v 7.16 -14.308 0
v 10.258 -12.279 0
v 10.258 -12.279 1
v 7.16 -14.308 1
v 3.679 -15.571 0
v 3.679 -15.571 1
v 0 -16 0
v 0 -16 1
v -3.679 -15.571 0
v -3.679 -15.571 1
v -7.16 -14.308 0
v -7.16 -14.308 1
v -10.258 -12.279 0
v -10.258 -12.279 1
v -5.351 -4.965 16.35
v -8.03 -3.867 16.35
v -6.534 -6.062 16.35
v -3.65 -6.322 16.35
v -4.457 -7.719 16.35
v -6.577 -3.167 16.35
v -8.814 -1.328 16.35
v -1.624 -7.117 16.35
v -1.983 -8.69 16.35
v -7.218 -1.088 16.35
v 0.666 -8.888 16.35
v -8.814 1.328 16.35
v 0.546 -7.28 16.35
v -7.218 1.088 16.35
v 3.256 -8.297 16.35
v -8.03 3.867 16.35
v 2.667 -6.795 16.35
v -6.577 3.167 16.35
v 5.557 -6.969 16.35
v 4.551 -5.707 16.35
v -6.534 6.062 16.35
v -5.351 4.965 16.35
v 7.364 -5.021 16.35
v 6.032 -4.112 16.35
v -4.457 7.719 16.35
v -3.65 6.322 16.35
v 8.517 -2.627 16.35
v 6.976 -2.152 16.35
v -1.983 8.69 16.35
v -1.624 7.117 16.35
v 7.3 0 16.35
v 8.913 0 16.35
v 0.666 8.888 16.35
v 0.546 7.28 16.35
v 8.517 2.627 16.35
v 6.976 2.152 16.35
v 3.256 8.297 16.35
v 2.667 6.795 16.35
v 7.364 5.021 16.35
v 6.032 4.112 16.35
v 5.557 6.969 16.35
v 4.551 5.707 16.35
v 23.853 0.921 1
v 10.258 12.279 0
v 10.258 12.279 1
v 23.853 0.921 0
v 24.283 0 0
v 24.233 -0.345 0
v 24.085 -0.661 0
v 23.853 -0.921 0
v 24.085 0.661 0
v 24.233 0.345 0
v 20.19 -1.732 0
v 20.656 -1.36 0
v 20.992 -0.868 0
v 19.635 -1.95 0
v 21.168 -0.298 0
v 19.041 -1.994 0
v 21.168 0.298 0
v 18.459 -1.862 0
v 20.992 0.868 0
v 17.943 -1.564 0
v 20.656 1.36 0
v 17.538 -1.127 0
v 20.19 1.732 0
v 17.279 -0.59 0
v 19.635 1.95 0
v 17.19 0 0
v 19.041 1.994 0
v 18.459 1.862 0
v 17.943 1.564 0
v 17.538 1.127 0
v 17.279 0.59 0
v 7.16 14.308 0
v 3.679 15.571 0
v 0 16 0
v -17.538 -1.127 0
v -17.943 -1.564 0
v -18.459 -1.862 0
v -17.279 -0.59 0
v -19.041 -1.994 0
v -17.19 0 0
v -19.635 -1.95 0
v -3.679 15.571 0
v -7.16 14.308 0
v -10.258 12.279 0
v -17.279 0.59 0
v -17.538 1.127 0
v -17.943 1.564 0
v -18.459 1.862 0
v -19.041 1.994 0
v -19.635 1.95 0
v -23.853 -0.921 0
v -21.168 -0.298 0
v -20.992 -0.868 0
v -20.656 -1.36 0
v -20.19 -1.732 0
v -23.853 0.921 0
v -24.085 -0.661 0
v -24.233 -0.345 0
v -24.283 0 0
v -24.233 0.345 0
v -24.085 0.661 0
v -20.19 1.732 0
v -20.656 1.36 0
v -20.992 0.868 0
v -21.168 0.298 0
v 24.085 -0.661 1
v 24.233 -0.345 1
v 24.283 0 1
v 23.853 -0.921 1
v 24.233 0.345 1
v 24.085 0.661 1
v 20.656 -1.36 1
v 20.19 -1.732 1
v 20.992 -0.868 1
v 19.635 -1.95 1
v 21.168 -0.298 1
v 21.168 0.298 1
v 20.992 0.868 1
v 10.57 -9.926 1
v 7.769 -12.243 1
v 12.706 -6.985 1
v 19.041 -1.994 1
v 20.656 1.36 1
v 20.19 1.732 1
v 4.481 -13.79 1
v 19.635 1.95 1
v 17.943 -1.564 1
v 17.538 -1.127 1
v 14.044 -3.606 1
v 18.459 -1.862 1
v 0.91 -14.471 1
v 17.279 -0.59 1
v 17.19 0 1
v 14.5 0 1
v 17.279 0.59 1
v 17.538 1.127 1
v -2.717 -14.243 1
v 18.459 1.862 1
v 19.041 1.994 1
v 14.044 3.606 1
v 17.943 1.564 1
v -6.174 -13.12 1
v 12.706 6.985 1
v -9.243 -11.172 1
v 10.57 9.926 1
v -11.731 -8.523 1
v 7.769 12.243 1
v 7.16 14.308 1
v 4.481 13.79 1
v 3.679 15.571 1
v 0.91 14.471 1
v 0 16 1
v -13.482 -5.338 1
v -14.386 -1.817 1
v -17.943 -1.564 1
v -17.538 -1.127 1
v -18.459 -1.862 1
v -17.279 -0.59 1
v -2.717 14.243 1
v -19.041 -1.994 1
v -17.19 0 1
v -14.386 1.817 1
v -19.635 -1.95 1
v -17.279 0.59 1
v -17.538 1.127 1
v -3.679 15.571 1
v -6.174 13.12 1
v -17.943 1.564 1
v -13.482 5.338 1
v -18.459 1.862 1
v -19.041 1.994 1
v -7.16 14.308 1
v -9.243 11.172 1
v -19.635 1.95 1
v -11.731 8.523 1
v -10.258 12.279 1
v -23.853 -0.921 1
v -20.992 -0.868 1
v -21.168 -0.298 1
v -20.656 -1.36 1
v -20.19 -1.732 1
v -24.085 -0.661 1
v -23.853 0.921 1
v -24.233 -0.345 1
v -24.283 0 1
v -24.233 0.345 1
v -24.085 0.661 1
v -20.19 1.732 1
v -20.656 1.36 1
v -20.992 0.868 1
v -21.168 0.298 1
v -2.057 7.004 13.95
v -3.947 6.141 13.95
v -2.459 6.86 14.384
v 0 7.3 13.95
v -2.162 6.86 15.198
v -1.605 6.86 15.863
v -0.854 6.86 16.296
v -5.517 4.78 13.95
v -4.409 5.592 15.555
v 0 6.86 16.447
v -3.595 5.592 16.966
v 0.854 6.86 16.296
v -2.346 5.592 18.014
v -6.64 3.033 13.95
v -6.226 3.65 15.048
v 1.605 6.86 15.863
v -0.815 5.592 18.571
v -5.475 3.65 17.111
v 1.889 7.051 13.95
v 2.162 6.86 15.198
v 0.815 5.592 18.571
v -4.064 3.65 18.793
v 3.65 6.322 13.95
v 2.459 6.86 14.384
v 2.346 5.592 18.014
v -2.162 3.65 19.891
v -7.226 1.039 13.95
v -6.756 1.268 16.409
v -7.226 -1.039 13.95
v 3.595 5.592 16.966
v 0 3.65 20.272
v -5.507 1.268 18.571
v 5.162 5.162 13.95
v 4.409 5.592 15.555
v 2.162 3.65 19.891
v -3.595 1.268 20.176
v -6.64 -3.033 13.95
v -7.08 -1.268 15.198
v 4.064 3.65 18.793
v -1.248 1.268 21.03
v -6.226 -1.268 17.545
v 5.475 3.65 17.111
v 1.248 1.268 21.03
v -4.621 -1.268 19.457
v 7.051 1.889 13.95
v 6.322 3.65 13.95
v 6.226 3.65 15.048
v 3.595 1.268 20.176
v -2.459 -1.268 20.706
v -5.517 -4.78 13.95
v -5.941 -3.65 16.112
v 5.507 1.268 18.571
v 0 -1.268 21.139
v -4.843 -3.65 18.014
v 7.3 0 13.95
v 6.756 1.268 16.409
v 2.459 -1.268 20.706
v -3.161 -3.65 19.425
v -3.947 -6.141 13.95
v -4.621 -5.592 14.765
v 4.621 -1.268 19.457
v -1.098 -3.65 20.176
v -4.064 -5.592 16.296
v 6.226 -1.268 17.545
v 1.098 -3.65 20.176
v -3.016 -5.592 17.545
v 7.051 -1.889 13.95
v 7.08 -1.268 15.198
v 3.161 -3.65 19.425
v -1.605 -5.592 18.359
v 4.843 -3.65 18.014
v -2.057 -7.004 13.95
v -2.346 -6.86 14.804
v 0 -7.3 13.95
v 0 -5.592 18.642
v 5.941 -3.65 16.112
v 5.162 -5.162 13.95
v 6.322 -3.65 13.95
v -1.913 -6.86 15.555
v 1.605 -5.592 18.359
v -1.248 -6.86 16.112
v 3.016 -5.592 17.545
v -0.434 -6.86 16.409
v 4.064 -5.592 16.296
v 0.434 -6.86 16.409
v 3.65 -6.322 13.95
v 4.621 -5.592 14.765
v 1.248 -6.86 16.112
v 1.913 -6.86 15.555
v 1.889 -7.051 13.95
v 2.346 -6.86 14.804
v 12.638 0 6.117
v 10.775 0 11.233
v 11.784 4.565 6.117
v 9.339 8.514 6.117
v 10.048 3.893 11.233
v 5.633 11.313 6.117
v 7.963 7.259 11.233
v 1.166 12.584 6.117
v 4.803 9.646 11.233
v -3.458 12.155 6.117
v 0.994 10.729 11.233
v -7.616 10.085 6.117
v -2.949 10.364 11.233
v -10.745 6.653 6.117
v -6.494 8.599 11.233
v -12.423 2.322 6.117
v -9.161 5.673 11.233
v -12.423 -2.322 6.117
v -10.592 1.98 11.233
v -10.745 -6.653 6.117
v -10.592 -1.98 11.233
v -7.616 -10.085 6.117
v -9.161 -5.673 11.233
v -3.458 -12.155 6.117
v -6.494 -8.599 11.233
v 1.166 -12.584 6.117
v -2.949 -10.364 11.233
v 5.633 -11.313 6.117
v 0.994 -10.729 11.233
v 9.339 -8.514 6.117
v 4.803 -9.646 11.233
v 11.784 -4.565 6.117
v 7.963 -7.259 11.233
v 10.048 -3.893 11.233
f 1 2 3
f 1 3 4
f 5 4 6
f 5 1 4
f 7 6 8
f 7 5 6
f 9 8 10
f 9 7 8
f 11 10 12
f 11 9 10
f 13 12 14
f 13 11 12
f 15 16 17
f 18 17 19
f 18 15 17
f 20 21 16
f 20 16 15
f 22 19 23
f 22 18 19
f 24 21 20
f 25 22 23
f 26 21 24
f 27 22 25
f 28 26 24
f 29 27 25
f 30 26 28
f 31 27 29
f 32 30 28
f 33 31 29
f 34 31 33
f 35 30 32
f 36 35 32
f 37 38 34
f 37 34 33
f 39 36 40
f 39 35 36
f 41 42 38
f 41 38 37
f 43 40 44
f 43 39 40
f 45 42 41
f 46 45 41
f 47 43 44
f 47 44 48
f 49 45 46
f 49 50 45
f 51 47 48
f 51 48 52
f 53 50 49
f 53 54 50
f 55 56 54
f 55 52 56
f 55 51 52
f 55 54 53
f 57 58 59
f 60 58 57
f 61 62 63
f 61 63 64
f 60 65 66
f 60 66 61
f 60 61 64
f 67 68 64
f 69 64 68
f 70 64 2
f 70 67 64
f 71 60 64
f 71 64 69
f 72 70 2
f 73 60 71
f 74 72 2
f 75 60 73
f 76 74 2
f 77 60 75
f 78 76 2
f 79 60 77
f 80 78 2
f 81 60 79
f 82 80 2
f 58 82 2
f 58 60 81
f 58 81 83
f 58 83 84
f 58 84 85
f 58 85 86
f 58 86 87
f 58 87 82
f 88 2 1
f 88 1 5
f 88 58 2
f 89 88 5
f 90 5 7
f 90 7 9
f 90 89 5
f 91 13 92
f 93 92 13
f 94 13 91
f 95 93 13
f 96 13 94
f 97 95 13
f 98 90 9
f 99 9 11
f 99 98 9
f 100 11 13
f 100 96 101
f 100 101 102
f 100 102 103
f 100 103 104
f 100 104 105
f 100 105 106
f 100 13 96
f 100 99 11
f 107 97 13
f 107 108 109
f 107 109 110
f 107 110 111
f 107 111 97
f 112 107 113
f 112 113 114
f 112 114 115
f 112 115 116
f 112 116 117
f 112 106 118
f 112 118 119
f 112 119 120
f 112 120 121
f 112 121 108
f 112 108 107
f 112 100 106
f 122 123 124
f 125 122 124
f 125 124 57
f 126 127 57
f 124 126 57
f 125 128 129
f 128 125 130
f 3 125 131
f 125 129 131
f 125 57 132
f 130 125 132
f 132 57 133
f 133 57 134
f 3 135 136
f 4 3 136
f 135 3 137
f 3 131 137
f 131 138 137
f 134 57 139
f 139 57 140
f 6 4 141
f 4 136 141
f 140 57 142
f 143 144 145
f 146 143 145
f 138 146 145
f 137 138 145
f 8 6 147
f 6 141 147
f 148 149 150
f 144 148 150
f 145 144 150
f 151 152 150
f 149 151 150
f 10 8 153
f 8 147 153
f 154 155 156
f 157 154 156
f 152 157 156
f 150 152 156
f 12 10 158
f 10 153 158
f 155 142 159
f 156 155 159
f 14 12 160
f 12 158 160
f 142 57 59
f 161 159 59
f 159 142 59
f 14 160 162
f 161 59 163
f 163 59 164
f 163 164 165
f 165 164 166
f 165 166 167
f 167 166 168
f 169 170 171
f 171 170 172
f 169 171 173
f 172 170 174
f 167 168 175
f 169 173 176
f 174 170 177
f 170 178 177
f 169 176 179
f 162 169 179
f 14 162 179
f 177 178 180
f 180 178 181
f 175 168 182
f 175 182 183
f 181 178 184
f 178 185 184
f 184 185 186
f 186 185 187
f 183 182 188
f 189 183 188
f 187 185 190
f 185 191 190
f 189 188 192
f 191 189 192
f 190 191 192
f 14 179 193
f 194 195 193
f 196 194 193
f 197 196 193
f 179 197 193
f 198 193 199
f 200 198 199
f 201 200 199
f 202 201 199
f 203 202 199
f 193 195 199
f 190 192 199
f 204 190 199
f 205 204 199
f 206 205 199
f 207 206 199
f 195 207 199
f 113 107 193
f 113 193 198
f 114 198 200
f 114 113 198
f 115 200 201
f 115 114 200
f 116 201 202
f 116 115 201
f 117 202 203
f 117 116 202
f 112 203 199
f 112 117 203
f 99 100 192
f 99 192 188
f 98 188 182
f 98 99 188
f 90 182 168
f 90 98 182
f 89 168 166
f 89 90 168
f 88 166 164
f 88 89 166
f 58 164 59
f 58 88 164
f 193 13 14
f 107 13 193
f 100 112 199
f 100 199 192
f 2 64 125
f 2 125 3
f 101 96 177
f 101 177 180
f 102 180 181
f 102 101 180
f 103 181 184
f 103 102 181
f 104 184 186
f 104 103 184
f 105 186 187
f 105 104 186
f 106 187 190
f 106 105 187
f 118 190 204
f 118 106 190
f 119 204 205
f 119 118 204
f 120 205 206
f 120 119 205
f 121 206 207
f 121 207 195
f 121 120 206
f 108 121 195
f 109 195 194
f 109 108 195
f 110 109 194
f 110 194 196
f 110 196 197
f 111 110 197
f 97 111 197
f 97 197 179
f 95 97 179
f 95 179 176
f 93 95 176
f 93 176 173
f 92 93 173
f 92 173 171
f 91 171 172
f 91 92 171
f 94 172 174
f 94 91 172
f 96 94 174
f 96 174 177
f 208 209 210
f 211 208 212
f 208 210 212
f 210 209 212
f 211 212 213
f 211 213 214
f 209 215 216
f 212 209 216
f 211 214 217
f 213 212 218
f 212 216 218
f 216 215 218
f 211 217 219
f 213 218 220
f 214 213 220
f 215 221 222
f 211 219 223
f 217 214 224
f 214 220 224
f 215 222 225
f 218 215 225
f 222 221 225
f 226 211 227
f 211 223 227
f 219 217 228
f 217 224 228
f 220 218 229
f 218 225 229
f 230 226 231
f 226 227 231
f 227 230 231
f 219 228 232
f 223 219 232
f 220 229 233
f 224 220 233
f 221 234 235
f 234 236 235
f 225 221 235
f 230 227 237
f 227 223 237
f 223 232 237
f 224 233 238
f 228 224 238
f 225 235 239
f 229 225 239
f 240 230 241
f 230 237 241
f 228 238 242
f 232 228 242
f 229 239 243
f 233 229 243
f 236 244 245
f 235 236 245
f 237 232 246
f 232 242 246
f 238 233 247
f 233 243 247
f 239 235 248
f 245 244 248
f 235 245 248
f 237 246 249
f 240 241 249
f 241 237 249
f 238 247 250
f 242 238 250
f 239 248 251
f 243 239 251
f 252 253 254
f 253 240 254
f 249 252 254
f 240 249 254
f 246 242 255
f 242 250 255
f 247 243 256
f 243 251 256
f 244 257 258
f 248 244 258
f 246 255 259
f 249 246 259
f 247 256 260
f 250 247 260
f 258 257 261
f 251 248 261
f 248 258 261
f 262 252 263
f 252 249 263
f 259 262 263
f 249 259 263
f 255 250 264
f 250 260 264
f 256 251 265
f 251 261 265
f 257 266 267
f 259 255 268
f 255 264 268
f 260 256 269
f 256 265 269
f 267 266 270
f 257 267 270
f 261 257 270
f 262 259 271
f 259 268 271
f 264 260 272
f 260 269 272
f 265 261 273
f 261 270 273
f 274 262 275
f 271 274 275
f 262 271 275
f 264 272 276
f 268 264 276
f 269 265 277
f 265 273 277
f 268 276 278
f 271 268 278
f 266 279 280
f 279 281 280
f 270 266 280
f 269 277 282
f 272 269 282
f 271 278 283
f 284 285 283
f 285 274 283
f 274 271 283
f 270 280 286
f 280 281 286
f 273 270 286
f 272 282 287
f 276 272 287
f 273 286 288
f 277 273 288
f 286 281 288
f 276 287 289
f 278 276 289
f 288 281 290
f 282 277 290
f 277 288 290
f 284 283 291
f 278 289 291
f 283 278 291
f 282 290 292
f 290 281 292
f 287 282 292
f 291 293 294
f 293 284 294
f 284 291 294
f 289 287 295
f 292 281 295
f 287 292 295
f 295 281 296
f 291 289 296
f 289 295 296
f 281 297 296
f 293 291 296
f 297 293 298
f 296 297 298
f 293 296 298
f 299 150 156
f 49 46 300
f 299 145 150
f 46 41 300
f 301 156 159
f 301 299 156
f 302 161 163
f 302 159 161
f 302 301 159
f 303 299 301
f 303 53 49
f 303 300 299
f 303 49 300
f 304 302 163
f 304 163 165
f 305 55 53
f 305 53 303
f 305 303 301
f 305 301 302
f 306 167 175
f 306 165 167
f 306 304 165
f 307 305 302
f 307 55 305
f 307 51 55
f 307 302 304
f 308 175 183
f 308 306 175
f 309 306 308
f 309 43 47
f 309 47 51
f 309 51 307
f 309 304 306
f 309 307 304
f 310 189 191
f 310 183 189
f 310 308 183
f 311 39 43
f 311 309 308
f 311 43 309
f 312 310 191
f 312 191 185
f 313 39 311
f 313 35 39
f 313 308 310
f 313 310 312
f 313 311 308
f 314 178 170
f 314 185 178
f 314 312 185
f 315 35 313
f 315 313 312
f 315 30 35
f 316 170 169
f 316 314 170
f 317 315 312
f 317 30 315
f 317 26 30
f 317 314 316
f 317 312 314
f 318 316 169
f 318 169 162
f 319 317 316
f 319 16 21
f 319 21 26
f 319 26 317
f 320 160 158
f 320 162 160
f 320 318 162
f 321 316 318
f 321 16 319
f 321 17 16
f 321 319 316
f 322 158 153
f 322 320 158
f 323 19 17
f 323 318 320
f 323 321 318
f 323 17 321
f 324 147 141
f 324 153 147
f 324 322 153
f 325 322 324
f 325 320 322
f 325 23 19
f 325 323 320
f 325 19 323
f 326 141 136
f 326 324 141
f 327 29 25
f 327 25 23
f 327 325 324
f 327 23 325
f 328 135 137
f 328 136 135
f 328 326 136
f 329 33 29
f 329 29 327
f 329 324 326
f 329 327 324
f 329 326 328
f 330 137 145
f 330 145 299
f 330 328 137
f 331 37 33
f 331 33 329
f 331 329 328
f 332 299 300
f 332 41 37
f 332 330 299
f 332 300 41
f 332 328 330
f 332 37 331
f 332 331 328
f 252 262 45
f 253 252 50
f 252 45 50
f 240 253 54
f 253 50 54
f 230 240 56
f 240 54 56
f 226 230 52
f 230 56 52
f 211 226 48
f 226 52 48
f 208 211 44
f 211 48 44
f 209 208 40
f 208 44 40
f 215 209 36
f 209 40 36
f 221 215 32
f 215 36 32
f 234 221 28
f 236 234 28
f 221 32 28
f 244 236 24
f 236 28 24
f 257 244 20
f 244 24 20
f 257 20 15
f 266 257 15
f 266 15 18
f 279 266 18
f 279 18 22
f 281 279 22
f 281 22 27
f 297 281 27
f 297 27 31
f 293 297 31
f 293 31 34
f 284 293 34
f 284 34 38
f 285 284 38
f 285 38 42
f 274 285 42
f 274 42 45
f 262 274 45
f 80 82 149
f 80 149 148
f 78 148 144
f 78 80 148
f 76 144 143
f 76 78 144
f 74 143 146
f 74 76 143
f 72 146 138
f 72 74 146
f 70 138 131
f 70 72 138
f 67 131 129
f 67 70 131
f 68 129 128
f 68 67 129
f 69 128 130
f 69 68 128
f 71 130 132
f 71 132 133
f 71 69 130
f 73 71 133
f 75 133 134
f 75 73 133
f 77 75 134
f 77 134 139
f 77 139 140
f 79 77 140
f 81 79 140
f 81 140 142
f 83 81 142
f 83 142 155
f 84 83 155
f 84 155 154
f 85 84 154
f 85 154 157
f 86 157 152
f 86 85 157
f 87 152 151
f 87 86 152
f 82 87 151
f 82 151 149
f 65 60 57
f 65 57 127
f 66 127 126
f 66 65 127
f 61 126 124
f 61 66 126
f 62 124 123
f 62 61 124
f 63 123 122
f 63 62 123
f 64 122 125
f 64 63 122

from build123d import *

# Parameters (mm, degrees)
SKETCH1_R           = 2
BOSS_EXTRUDE1_DEPTH = 1
SKETCH2_R           = 14.5
BOSS_EXTRUDE7_DEPTH = 15.35
BOSS_EXTRUDE7_TAPER = 20
SKETCH5_R           = 7.3
CUT_EXTRUDE1_DEPTH  = 2.4


with BuildPart() as part:
    # Sketch1 → Boss-Extrude1 (new body)
    with BuildSketch(Plane.XY):
        with BuildLine():
            Line((-23.852790838, 0.920895504), (-10.258451011, 12.278606715))
            ThreePointArc((-10.258451011, 12.278606715), (0, 16), (10.258451011, 12.278606715))
            Line((10.258451011, 12.278606715), (23.852790838, 0.920895504))
            ThreePointArc((23.852790838, 0.920895504), (24.283407012, 0), (23.852790838, -0.920895504))
            Line((23.852790838, -0.920895504), (10.258451011, -12.278606715))
            ThreePointArc((10.258451011, -12.278606715), (0, -16), (-10.258451011, -12.278606715))
            Line((-10.258451011, -12.278606715), (-23.852790838, -0.920895504))
            ThreePointArc((-23.852790838, -0.920895504), (-24.283407012, 0), (-23.852790838, 0.920895504))
        make_face()
        with Locations((-19.19, 0)):
            Circle(SKETCH1_R, mode=Mode.SUBTRACT)
        with Locations(Location((19.19, 0, 0), (0, 0, 180))):
            Circle(SKETCH1_R, mode=Mode.SUBTRACT)
    extrude(amount=BOSS_EXTRUDE1_DEPTH)

    # Sketch2 → Boss-Extrude7 (add)
    with BuildSketch(Plane.XY.offset(1)):
        Circle(SKETCH2_R)
    extrude(amount=BOSS_EXTRUDE7_DEPTH, taper=BOSS_EXTRUDE7_TAPER)

    # Sketch5 → Cut-Extrude1 (cut)
    with BuildSketch(Plane.XY.offset(16.35)):
        Circle(SKETCH5_R)
    extrude(amount=-CUT_EXTRUDE1_DEPTH, mode=Mode.SUBTRACT)

    # Sketch6 → Revolve3 (revolve)
    with BuildSketch(Plane.XY.offset(13.95)):
        with BuildLine():
            Line((0, -7.3), (0, 7.3))
            ThreePointArc((0, 7.3), (-7.3, 0), (0, -7.3))
        make_face()
    revolve(axis=Axis((0, -7.3, 13.95), (0, 1, 0)))


solid = part.part
